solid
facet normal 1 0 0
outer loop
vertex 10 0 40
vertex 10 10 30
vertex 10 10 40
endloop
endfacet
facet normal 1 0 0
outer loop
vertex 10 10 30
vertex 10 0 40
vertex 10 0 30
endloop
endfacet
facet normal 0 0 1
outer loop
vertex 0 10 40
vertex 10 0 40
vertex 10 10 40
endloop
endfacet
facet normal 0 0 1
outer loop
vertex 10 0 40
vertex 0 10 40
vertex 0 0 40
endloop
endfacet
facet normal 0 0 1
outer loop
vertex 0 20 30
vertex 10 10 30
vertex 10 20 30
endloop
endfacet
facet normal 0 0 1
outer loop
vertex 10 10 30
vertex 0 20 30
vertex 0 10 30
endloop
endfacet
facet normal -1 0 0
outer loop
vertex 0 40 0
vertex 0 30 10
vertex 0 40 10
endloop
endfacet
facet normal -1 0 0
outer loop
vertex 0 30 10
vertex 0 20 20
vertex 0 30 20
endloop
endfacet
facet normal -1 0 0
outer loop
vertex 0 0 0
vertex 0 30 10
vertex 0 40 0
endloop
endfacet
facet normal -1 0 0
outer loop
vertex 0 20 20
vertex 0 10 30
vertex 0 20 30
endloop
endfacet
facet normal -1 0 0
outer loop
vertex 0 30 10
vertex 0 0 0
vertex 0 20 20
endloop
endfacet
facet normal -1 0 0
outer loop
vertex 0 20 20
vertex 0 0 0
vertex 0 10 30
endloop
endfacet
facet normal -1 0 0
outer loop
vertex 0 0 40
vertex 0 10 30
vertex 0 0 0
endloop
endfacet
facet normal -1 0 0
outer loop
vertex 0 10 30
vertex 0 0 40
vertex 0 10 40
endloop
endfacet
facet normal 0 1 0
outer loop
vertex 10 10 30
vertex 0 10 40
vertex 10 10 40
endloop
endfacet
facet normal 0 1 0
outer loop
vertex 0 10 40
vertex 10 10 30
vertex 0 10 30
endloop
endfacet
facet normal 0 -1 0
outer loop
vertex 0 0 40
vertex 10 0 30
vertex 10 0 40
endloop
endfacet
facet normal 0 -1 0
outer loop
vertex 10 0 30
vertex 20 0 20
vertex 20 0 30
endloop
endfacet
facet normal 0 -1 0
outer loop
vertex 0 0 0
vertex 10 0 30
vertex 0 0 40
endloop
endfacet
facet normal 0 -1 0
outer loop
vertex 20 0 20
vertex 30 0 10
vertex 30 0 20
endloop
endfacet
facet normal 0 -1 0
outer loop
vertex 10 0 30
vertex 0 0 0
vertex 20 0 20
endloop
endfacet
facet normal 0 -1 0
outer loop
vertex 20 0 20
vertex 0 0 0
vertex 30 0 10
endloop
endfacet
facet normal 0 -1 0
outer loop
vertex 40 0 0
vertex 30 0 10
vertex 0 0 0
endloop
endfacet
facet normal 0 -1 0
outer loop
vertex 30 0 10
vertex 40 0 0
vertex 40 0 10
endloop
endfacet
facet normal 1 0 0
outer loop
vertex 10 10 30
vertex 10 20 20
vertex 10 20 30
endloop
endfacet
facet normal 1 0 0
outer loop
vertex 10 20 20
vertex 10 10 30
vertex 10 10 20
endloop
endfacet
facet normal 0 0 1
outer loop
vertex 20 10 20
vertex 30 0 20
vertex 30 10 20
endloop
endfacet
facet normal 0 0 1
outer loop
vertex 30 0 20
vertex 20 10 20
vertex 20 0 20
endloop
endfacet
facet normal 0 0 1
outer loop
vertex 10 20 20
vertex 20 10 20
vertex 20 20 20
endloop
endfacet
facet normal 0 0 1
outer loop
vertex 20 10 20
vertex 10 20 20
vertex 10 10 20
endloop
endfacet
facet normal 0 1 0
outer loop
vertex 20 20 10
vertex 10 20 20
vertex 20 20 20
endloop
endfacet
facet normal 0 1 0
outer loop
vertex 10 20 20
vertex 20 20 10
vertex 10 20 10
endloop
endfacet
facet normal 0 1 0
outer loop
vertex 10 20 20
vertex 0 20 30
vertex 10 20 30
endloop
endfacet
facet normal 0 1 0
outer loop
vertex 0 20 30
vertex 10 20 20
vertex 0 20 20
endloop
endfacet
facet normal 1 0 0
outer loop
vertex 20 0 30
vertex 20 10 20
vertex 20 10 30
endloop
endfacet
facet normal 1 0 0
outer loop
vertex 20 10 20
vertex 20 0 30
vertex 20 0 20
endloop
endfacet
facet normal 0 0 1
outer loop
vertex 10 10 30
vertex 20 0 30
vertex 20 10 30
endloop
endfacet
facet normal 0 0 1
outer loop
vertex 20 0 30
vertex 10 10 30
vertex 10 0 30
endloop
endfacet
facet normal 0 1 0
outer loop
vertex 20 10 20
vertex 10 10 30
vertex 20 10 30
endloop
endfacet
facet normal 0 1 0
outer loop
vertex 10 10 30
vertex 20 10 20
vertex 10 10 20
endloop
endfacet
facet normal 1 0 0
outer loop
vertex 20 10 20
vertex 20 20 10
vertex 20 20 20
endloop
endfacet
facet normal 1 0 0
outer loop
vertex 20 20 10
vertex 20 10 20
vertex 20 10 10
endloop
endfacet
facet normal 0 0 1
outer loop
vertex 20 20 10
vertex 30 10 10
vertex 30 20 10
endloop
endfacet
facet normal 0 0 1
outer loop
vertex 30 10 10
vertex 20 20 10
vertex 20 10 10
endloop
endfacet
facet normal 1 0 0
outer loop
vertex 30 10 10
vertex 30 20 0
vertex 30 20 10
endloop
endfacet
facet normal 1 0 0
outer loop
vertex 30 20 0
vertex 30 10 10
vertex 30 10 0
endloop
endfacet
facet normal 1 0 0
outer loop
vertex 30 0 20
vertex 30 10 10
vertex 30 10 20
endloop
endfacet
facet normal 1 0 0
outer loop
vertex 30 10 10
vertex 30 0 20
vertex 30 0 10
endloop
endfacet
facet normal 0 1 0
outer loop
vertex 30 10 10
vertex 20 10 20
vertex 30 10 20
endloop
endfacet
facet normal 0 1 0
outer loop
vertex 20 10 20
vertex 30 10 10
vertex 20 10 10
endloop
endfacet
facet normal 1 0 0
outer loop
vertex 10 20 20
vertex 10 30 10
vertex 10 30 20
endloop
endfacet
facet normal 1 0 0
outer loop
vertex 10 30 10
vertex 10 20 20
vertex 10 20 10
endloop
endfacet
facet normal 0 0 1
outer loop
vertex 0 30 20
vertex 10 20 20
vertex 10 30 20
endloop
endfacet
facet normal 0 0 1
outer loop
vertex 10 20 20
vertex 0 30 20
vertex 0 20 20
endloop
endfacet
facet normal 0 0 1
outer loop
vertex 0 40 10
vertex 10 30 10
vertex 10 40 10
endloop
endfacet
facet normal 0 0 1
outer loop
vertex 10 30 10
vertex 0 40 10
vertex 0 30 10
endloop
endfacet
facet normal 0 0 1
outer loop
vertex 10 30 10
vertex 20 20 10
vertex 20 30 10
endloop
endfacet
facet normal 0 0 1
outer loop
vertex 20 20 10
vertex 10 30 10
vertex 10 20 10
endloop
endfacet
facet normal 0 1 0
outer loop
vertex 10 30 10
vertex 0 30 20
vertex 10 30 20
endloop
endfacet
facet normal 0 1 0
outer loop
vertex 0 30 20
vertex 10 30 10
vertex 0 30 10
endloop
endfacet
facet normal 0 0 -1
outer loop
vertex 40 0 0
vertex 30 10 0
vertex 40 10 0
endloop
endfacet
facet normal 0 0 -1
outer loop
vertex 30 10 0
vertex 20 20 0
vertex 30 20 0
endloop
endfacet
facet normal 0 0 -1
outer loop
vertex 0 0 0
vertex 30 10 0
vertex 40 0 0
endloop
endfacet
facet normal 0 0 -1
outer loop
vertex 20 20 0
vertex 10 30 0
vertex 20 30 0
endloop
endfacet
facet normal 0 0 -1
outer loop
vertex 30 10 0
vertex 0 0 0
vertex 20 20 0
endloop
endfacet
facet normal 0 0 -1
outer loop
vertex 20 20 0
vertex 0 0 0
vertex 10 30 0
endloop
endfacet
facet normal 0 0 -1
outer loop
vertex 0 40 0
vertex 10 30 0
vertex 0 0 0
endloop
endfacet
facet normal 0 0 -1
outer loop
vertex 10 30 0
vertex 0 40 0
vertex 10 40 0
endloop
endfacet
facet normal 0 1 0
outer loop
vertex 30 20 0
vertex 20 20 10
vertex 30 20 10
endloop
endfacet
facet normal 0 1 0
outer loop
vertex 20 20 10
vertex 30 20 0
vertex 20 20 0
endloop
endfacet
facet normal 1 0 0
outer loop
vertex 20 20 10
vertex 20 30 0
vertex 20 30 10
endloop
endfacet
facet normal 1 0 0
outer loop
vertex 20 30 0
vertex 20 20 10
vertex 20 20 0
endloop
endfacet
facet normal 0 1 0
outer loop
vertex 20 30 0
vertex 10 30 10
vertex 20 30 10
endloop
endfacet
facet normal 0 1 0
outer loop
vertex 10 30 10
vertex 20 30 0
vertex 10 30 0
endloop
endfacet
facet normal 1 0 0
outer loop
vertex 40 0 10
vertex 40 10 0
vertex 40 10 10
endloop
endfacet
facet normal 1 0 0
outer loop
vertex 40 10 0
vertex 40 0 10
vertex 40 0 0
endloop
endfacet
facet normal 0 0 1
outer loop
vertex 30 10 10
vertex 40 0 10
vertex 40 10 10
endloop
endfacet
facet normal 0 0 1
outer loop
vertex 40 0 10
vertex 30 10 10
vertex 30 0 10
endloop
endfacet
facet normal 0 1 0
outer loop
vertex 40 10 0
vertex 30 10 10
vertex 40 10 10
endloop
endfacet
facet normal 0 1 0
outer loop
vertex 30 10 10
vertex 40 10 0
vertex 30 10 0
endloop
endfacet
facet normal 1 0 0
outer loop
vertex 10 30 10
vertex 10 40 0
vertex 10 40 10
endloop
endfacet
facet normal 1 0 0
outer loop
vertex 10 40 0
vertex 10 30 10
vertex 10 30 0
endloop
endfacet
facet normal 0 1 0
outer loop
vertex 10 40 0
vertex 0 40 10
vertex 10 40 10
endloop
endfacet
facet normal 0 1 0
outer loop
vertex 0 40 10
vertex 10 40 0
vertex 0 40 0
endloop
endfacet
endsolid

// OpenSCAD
// 3D Shapes- Calibration Pyramid

// level 4
translate([0, 0, 30]) cube(10);

// level 3
translate([0, 0, 20]) cube([10, 20, 10]);
translate([10, 0, 20]) cube(10);

// level 2
translate([0, 0, 10]) cube([20, 20, 10]);
translate([20, 0, 10]) cube(10);
translate([0, 20, 10]) cube(10);

// level 1
cube([30, 20, 10]);
translate([0, 20, 0]) cube([20, 10, 10]);
translate([30, 0, 0]) cube(10);
translate([0, 30, 0]) cube(10);
